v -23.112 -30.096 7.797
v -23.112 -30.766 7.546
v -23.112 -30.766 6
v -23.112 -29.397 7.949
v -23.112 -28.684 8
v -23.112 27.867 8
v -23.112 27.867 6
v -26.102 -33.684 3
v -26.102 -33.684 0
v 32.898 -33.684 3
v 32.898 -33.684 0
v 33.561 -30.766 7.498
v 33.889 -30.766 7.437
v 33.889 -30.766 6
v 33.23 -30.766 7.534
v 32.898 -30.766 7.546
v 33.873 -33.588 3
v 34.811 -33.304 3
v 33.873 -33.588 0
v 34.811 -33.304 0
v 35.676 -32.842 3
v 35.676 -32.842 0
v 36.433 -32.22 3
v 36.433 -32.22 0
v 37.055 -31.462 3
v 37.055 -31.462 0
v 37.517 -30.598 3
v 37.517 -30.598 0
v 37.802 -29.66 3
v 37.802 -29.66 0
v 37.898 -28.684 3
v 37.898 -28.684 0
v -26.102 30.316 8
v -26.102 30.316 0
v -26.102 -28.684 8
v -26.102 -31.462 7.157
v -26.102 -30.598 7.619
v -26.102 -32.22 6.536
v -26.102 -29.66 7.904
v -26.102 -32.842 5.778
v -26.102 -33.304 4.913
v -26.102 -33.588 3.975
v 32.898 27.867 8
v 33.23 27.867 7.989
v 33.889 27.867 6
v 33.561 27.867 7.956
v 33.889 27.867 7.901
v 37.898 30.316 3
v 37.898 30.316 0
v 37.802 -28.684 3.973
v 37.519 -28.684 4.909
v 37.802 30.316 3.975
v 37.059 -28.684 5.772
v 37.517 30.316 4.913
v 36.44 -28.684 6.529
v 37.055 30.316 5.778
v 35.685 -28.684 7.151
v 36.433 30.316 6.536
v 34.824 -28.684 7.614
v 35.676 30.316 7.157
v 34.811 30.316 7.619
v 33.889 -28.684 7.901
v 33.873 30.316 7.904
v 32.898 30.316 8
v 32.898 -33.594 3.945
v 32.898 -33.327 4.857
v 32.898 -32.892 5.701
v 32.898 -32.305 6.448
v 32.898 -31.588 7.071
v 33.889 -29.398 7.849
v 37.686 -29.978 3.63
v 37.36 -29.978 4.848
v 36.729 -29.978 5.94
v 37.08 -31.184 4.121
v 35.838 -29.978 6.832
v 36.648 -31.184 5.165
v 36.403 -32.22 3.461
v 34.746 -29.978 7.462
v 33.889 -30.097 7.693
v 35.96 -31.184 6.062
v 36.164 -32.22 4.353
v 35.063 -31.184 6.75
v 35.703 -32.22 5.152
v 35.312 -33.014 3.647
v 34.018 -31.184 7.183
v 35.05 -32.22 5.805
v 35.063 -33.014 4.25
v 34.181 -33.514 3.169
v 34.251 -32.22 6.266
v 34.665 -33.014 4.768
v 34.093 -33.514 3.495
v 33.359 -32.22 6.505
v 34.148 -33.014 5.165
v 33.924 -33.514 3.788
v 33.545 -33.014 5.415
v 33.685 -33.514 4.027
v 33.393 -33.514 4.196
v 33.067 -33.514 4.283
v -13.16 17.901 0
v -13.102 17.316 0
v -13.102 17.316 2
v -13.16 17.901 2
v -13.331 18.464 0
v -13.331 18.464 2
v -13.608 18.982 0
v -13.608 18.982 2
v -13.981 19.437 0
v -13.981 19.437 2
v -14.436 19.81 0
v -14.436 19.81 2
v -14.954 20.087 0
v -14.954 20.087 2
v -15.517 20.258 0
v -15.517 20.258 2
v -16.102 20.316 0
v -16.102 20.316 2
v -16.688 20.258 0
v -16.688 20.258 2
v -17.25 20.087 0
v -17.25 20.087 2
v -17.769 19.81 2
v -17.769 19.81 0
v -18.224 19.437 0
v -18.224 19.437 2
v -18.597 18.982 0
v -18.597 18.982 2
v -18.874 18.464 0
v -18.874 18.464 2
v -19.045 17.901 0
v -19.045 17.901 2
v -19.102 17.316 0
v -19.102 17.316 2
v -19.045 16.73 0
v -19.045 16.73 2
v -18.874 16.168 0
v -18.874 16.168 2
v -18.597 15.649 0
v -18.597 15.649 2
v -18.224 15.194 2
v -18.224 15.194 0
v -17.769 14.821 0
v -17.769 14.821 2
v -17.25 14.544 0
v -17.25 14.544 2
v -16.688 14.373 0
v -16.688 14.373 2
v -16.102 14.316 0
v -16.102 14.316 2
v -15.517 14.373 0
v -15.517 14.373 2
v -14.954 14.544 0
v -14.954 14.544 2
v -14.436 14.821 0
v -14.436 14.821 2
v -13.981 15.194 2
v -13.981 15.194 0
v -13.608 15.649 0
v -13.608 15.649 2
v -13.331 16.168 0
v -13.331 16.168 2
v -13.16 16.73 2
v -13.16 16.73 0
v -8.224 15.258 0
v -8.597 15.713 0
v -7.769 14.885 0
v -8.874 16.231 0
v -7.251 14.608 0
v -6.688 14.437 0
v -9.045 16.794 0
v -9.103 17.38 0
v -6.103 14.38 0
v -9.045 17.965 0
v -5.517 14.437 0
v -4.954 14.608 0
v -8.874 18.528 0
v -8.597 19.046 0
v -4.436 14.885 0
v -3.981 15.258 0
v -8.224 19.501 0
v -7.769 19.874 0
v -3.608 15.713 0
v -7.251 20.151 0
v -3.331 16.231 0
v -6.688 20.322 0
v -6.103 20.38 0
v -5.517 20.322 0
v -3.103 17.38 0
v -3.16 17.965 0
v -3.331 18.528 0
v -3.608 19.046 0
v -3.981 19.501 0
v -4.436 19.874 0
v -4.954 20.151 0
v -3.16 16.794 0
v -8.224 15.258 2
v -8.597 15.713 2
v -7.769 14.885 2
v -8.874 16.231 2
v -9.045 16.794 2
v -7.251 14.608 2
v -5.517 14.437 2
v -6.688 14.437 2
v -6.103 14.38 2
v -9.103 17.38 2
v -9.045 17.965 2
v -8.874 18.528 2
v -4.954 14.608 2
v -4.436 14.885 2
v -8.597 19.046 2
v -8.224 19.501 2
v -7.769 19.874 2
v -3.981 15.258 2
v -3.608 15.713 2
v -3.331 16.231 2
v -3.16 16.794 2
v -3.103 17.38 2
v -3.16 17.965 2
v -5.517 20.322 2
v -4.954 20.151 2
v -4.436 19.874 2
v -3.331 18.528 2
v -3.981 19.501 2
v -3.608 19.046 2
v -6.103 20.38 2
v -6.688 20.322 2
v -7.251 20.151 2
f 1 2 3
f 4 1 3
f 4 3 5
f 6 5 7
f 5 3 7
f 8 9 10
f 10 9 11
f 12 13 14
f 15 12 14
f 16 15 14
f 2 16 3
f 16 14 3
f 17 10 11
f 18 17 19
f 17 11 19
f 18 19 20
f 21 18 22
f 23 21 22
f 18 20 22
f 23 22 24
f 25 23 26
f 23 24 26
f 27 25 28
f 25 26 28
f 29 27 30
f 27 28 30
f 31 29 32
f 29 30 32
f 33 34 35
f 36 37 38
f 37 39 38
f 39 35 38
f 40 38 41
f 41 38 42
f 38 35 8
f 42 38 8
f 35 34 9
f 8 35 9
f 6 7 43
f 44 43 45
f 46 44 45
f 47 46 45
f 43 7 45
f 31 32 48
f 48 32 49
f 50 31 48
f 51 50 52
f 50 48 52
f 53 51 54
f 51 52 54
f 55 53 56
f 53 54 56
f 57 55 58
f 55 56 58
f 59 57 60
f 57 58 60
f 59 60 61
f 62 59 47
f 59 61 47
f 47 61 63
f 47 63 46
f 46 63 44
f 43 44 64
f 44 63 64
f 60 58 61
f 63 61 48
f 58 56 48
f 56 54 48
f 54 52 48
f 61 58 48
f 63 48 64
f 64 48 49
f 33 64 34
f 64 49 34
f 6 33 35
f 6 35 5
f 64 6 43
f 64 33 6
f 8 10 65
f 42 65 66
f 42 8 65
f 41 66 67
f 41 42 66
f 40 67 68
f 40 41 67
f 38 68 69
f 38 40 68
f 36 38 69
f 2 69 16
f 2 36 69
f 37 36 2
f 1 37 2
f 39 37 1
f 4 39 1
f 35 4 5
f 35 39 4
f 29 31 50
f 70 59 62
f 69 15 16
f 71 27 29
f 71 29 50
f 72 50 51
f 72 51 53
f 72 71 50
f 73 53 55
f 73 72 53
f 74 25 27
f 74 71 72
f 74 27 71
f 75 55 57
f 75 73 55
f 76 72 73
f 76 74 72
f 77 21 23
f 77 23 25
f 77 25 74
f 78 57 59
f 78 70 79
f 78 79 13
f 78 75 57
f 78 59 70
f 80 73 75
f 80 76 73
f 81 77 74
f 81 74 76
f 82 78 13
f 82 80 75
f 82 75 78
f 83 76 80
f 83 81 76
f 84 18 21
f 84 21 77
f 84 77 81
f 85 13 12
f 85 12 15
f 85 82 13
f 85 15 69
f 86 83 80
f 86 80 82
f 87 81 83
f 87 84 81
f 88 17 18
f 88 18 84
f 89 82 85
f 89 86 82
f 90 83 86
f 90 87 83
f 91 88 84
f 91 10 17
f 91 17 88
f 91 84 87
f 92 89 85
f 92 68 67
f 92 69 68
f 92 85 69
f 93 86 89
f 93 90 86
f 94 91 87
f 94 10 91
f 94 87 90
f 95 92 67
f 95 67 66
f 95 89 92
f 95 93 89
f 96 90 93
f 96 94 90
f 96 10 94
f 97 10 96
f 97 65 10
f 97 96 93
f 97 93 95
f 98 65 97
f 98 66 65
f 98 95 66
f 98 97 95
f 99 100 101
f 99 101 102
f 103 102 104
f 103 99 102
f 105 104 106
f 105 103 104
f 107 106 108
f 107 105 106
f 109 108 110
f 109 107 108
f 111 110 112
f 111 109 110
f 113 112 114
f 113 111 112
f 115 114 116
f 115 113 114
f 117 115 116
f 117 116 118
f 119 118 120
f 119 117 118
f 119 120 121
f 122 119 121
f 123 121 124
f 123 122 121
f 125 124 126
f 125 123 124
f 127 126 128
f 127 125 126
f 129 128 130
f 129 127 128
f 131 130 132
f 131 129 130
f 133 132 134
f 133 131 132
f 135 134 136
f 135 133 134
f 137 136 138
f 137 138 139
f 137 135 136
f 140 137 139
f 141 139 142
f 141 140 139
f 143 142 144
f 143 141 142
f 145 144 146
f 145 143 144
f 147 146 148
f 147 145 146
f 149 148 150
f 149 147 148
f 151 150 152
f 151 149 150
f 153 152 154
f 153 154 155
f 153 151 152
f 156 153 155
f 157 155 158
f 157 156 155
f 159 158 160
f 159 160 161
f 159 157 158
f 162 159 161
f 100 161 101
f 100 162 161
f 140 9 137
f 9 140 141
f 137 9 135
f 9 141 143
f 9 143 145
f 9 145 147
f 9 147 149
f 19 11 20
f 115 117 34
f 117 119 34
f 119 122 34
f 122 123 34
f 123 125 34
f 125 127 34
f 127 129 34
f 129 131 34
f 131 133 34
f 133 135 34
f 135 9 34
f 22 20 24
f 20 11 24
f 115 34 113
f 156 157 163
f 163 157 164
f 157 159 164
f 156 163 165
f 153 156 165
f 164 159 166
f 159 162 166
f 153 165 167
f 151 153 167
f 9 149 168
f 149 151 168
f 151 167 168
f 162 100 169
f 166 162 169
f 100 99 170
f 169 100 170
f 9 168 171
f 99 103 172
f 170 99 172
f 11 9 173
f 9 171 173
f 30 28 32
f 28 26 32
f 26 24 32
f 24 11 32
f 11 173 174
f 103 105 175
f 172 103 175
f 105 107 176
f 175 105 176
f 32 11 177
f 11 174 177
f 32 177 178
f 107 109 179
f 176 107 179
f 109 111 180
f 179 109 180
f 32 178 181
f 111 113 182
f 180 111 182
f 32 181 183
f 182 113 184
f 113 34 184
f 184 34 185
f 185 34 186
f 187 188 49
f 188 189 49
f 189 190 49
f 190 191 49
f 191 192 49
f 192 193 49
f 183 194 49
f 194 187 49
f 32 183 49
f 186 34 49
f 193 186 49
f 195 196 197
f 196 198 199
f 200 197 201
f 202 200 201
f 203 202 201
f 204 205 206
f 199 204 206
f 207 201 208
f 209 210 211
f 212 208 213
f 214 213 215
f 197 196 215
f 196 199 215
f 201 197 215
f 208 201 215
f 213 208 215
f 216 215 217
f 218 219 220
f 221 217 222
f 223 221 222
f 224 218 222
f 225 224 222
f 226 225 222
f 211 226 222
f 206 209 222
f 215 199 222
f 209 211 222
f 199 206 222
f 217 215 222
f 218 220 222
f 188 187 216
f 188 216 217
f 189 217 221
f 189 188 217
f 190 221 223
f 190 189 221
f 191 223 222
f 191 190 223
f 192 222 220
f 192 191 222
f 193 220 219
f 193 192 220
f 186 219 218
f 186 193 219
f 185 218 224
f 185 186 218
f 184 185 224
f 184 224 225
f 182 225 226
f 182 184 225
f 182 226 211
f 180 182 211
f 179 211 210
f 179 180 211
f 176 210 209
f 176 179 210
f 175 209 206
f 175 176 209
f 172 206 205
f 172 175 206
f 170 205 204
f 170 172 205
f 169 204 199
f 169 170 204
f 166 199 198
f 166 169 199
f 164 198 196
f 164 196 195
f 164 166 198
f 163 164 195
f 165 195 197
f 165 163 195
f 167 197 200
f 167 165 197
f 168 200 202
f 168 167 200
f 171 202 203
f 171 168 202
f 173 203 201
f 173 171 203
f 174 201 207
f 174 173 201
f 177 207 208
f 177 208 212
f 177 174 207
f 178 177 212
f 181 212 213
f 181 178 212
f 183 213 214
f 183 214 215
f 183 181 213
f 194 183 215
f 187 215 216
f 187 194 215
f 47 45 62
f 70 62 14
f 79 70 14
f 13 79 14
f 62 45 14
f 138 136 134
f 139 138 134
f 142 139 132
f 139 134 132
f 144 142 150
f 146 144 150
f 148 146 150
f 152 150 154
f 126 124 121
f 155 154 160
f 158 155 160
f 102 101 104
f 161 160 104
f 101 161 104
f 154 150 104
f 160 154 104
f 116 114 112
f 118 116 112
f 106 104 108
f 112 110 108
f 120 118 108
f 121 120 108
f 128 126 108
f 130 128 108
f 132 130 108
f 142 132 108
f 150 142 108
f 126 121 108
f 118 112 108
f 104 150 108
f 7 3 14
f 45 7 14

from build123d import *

# Parameters (mm, degrees)
F0_W         = 64
F0_H         = 64
F1_DEPTH     = 6
F2_R         = 3
F3_DEPTH     = 2
F5_DEPTH     = 2
F7_T1_DEPTH  = 71.5
F7_T3_DEPTH  = 15.5
F7_T5_DEPTH  = 71.5
F7_S9_W      = 5
F7_S9_H      = 5
F7_T10_DEPTH = 5


# Not quite as in the source:
# - a fillet or chamfer that OpenCascade refuses, or shapes differently, is made with other operations: its cross-section is extruded or revolved along the edge and cut away or added
# - a feature of the source that left no trace in its solid (it failed there, or was rolled back) is left out


with BuildPart() as f1:
    # F0 (on Top) → F1 (new body)
    with BuildSketch(Plane.XY):
        with Locations((5.897675477, -1.6843453527)):
            Rectangle(F0_W, F0_H)
    extrude(amount=F1_DEPTH)

    # F2 (on Top) → F3 (cut)
    with BuildSketch(Plane.XY):
        with Locations((-16.102324523, 17.3156546473)):
            Circle(F2_R)
        with Locations((-6.1025285926, 17.3795400876)):
            Circle(F2_R)
    extrude(amount=F3_DEPTH, mode=Mode.SUBTRACT)

    # F4 (on face) → F5 (join)
    with BuildSketch(Plane.XY.offset(6)):
        Polygon((-23.111552, 27.8670135885), (-26.102324523, 27.8670135885), (-26.102324523, -33.6843453527), (-23.111552, -33.6843453527), (-23.111552, -30.7656601071), align=None)
        Polygon((-26.102324523, 30.3156546473), (-26.102324523, 27.8670135885), (-23.111552, 27.8670135885), (33.8885635138, 27.8670135885), (37.897675477, 27.8670135885), (37.897675477, 30.3156546473), align=None)
        Polygon((37.897675477, 27.8670135885), (33.8885635138, 27.8670135885), (33.8885635138, -30.7656601071), (37.897675477, -30.7656601071), (37.897675477, -12.6674966887), align=None)
        Polygon((33.8885635138, -30.7656601071), (-23.111552, -30.7656601071), (-23.111552, -33.6843453527), (37.897675477, -33.6843453527), (37.897675477, -30.7656601071), align=None)
    extrude(amount=F5_DEPTH)

    # F7: fillet of radius 5 on 3 edges, made by hand

    # F7_s2 → F7_t1 (cut)
    with BuildSketch(Plane.YZ.offset(-38.602324523)):
        with BuildLine():
            ThreePointArc((-33.6843453527, 3), (-32.2198792586, 6.5355339059), (-28.6843453527, 8))
            Line((-28.6843453527, 8), (-33.6843453527, 8))
            Line((-33.6843453527, 8), (-33.6843453527, 3))
        make_face()
    extrude(amount=F7_T1_DEPTH, mode=Mode.SUBTRACT)

    # F7_s4 → F7_t3 (cut)
    with BuildSketch(Plane.XY.offset(-12.5)):
        with BuildLine():
            ThreePointArc((32.897675477, -33.6843453527), (36.4332093829, -32.2198792586), (37.897675477, -28.6843453527))
            Line((37.897675477, -28.6843453527), (37.897675477, -33.6843453527))
            Line((37.897675477, -33.6843453527), (32.897675477, -33.6843453527))
        make_face()
    extrude(amount=F7_T3_DEPTH, mode=Mode.SUBTRACT)

    # F7_s6 → F7_t5 (cut)
    with BuildSketch(Plane.XZ.offset(-42.8156546473)):
        with BuildLine():
            ThreePointArc((37.897675477, 3), (36.4332093829, 6.5355339059), (32.897675477, 8))
            Line((32.897675477, 8), (37.897675477, 8))
            Line((37.897675477, 8), (37.897675477, 3))
        make_face()
    extrude(amount=F7_T5_DEPTH, mode=Mode.SUBTRACT)


with BuildPart() as f7_tool8:
    # F7_s9 → F7_t10 (new body)
    with BuildSketch(Plane.XZ.offset(28.6843453527)):
        with Locations((35.397675477, 5.5)):
            Rectangle(F7_S9_W, F7_S9_H)
    extrude(amount=F7_T10_DEPTH)

    # F7_s11 → F7_t12 (revolve, cut)
    with BuildSketch(Plane(origin=(32.897675477, -28.6843453527, 3), x_dir=(-0.7071067812, 0, -0.7071067812), z_dir=(-0.7071067812, 0, 0.7071067812))):
        with BuildLine():
            ThreePointArc((0, -5), (5, 0), (0, 5))
            Line((0, 5), (0, -5))
        make_face()
    revolve(axis=Axis((32.897675477, -28.6843453527, 3), (0, -1, 0)), mode=Mode.SUBTRACT)


with BuildPart() as f1_1:
    add(f1.part)

    # F7_t7: cut F7_tool8
    add(f7_tool8.part, mode=Mode.SUBTRACT)


solid = f1_1.part
